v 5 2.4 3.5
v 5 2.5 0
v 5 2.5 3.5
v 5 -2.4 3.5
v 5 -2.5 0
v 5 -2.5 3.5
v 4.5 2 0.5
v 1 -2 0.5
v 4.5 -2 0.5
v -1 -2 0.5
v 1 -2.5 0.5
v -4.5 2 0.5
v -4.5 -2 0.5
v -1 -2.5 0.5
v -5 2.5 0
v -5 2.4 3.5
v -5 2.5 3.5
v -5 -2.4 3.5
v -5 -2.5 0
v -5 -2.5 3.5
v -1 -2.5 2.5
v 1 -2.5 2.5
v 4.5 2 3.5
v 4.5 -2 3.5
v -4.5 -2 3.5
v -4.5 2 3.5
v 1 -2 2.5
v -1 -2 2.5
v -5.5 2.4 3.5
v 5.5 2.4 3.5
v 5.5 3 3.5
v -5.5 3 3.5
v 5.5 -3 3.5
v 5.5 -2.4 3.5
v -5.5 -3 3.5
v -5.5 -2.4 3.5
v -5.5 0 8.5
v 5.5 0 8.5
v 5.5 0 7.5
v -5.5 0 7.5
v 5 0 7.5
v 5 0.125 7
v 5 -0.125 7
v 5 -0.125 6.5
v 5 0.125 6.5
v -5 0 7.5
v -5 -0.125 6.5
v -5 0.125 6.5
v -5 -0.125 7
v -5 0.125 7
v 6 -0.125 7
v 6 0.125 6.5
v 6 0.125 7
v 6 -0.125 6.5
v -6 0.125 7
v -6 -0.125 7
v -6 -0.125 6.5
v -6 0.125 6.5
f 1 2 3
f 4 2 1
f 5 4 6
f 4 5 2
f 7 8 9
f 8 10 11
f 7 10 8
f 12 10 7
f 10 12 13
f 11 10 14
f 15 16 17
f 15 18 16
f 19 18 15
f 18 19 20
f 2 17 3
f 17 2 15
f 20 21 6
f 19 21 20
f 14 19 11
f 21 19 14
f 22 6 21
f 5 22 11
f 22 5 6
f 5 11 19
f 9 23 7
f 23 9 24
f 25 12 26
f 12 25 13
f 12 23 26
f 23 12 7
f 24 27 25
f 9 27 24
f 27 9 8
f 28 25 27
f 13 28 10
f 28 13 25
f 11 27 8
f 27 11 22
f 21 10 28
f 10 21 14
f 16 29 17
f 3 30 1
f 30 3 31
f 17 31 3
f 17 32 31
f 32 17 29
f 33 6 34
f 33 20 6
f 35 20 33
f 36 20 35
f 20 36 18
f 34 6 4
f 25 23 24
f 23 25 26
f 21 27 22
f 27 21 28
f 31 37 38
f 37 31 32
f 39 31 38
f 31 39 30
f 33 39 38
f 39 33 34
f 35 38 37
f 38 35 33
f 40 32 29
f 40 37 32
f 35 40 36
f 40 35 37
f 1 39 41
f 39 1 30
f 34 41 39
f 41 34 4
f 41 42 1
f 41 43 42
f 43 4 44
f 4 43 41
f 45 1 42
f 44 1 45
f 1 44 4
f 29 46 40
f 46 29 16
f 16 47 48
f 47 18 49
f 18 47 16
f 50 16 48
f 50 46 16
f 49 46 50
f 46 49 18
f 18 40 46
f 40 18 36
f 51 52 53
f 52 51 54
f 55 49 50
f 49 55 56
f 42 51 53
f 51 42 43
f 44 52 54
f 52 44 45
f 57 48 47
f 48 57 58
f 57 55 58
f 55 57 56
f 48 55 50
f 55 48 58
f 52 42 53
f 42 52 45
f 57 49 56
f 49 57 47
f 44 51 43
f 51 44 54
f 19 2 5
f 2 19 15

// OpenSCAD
/*
    We divide the house into four components: the foundation, the lower walls,
    the upper walls, and the roof.
    
    The foundation is a flat layer that serves to define the building's
    footprint, and acts as a testament that the building once stood at all.
    
    The lower walls are the base for the upper walls, and are meant to be
    thicker and hardier. Stone to support the wood.

    The upper walls are moderately thinner than the lower walls, and are
    supposed to be stone, timber, or brick covered in plaster.
*/
/*
    To help keep things consistent, we'll define a set of constants and re-use
    them throughout.
    
    Here are some constants that AREN'T defined:
        - The "open" ends of the house's roof is always on the x-axis (so,
          looking up and down the y-axis, you see no gap)
        - The door is always centered on the X-axis, and sits ON the X-axis
          itself (the y-intercept, if you will)
*/
// What are the lengths of our foundation, per axis?
Y_FOUNDATION_LEN = 5;
X_FOUNDATION_LEN = 10;

// How tall is our foundation?
FOUNDATION_HEIGHT = .5;

// How thick are the lower walls?
LOWER_WALL_THICKNESS = .5;

// How tall are the lower walls? Keep in mind that this will be placed on TOP of
// the foundation
LOWER_WALL_HEIGHT = 1;

// How thick are the upper walls? This thickness will be centered around the
// lower walls, so that half of the thickness is on either half of the
// lower walls
UPPER_WALL_THICKNESS = .5;

// How tall are the upper walls? These walls will be placed on top of the lower
// walls; this height value is just the measure of the height of the components.
UPPER_WALL_HEIGHT = 2;

// The roof is distinctively peaked - what is the height of that peak? Keep in
// mind, this is just a measure of the roof component's height. This will be
// placed on top of the foundation and BOTH sets of walls!
ROOF_PEAK_HEIGHT = 5;

// The roof kinda peaks out on either side of the x and y axes. How far does it
// peak out from? The final roof will be the foundation size PLUS these values,
// where the overhang is doubled.
ROOF_X_OVERHANG = .5;
ROOF_Y_OVERHANG = .5;

// To create a "Divot" either side of the roof's x length, we create
// triangular prisms on either end and 'sink' them, cutting them out from the
// greater triangle. How much do we sink the divot? (move negative on Z)
ROOF_DIVOT_OFFSET = 1;

// To add an extra layer of medieval-authenticity, we'll put a crossbeam beneath
// the apex of the roof - how much do we sink the crossbeam downward?
ROOF_CROSSBEAM_OFFSET = 2.0;
// How deep is the crossbeam? (Length on Y Axis)
ROOF_CROSSBEAM_DEPTH = 0.25;
// How tall is the crossbeam? (Length on Z Axis)
ROOF_CROSSBEAM_HEIGHT = 0.5;
// Now, the crossbeam needs to peek out from underneath the roof's awning; this
// means the length (Length on X Axis) will AT LEAST be:
// (ROOF_X_OVERHANG * 2) + X_FOUNDATION_LEN
// This is the additional length ON TOP OF THAT length, so that the crossbeam
// hangs out at either end of the roof
ROOF_CROSSBEAM_OVERHANG = 0.5;

// How wide is the door?
DOOR_WIDTH = 2;

// How tall is the door? Remember, the door sits atop the foundation!
DOOR_HEIGHT = 2;

assert(UPPER_WALL_THICKNESS <= LOWER_WALL_THICKNESS, "Thickness of the upper walls must be less than or equal the thickness of the lower walls!");

module right_triangular_prism(x_len, y_len, h){
    polyhedron(
        points=[
            [0,0,0], 
            [x_len,0,0],
            [x_len,y_len,0],
            [0,y_len,0],
            [0,y_len,h],
            [x_len,y_len,h]
        ],
        faces=[
            [0,1,2,3],
            [5,4,3,2],
            [0,4,5,1],
            [0,3,4],
            [5,2,1]
        ]
    );
}
//

module isosceles_triangular_prism(x_len, y_len, height){
    polyhedron(
        points=[
            [    0,     0,      0], 
            [x_len,     0,      0],
            [x_len, y_len,      0],
            [    0, y_len,      0], 
            [    0, y_len / 2, height],
            [x_len, y_len / 2, height]
        ],
        faces=[
            [0,1,2,3],
            [5,4,3,2],
            [0,4,5,1],
            [0,3,4],
            [5,2,1]
        ]
    );
}
//

// Create the foundation, which is really just a blank square
module foundation(){
    cube( [X_FOUNDATION_LEN, Y_FOUNDATION_LEN, FOUNDATION_HEIGHT] );
}
//

// The door isn't a door so much as an empty space carved into the walls. To
// carve out the door, we need a block to carve with - this is that block.
module door_spacing_block(){
    centering_translation = [
        (X_FOUNDATION_LEN / 2) - (DOOR_WIDTH / 2), 
        -LOWER_WALL_THICKNESS / 2,
        FOUNDATION_HEIGHT
    ]; 
    
    translate(centering_translation)
    cube( [DOOR_WIDTH, LOWER_WALL_THICKNESS * 2, DOOR_HEIGHT] );
}
//

// Makes the lower walls, without a door. This is important, since we have to
// carve the space for the door out of something
module lower_walls_doorless(){
    /*
        Consider a rectangle, A, that contains a rectangle, B, such that the
        edges of B are at a constant distance from each other (this might break
        down around the edges, because diagonals, but whatever). We'll call this
        constant distance C. We know that the length of A minus the 
        length of B equals 2 * C (since there's a C of difference on either
        side). This allows us to calculate:
    
        A = 2C + B
        B = A - 2C
        C = (A - B) / 2
    
        In this case, A is our foundation length, and C is the lower wall's
        thickness. The size of the room to carve, then, is B!
    */
    // For our initial carve, A is the Foundation length, and B is the Lower
    // Wall thickness.
    carve_factor_x = X_FOUNDATION_LEN - ( 2 * LOWER_WALL_THICKNESS);
    carve_factor_y = Y_FOUNDATION_LEN - ( 2 * LOWER_WALL_THICKNESS);

    // The walls are made by carving out a block from the center of a larger
    // block - how do we move that smaller block?
    carver_translation = [
        LOWER_WALL_THICKNESS, // Move by C
        LOWER_WALL_THICKNESS, // Move by C
        -LOWER_WALL_HEIGHT / 2
    ]; 
    
    translate([0, 0, FOUNDATION_HEIGHT])
    difference(){
        cube( [X_FOUNDATION_LEN, Y_FOUNDATION_LEN, LOWER_WALL_HEIGHT] );
        
        translate(carver_translation)
        cube( [carve_factor_x, carve_factor_y, LOWER_WALL_HEIGHT * 2 ]);
    }
}
//

// Makes the lower walls, without a door. This is important, since we have to
// carve the space for the door out of something
module upper_walls_doorless(){
    
    /*cube( [carve_size_x, carve_size_y, UPPER_WALL_HEIGHT + .2 ])
        Now, with the Upper Wall, things get tricky. The wall must be centered
        on the lower wall. So, we have basically FOUR rectangles now instead of
        just two. We have the two rectangles we had for the lower walls, A and
        B, which are separated by a consistent distance, C. However, there are
        now two rectangles between them, that we'll call Q and R. Q and R are
        a new constant distance apart, D. Q is a consistent Distance from A,   
        which we'll call E, and R is the same with B; this shall the same value
        as E.
        
        In this case, our values are:
        A = FOUNDATION_LEN
        B = ???
        C = LOWER_WALL_THICKNESS
        D = UPPER_WALL_THICKNESS
        E = ???
        
        We know how to calculate C, but how about E? Well, we know that D is 
        centered ON C, and E is the leftover distance on either side - ergo,
        there'll be two of them. So, we know that C is:
        
        C = D + E2
        
        Solving for E, this becomes:
        
        E = (C - D) / 2
        
        Of course, we can't forget that E exists on both sides of EACH TRIANGLE!
        So the size of our first rectangle is (A - 2E). The carving rectangle
        will then be (A - 2(E + D)). To carve out the rectangle considering a
        start at origin, we need to shift the carving rectangle by the width of
        D
    */
    // What's the size of E from that giant stupid explanation we just did
    e_factor = (LOWER_WALL_THICKNESS - UPPER_WALL_THICKNESS) / 2;
    
    // A - 2 * E
    base_size_x = X_FOUNDATION_LEN - (2 * e_factor);
    base_size_y = Y_FOUNDATION_LEN - (2 * e_factor);
    
    // A - 2 * (E + D)
    carve_size_x = X_FOUNDATION_LEN - 2 * (e_factor + UPPER_WALL_THICKNESS);
    carve_size_y = Y_FOUNDATION_LEN - 2 * (e_factor + UPPER_WALL_THICKNESS);
    
    carve_shift= [
        UPPER_WALL_THICKNESS, // D
        UPPER_WALL_THICKNESS, // D
        -.1
    ];
    
    translate([e_factor, e_factor, FOUNDATION_HEIGHT + LOWER_WALL_HEIGHT])
    difference(){
        cube( [base_size_x, base_size_y, UPPER_WALL_HEIGHT] );
        
        translate(carve_shift)
        cube( [carve_size_x, carve_size_y, UPPER_WALL_HEIGHT + .2 ]);
    }
}
//

module lower_walls(){   
    difference(){
        lower_walls_doorless();
        door_spacing_block();
    }
}
//

module upper_walls(){   
    difference(){
        upper_walls_doorless();
        door_spacing_block();
    }
}
//

module roof(){
    
    ROOF_BASE_HEIGHT = UPPER_WALL_HEIGHT + LOWER_WALL_HEIGHT + FOUNDATION_HEIGHT;
    
    X_ROOF_LEN = X_FOUNDATION_LEN + (ROOF_X_OVERHANG * 2);
    Y_ROOF_LEN = Y_FOUNDATION_LEN + (ROOF_Y_OVERHANG * 2);
    
    difference(){
        difference() {
            translate([
                -ROOF_X_OVERHANG, 
                -ROOF_Y_OVERHANG, 
                ROOF_BASE_HEIGHT
            ])
            isosceles_triangular_prism(
                X_ROOF_LEN, 
                Y_ROOF_LEN, 
                ROOF_PEAK_HEIGHT
            );
            
            translate([
                X_FOUNDATION_LEN,
                -ROOF_Y_OVERHANG,
                ROOF_BASE_HEIGHT - ROOF_DIVOT_OFFSET
            ])
            isosceles_triangular_prism(
                ROOF_X_OVERHANG, 
                Y_ROOF_LEN, 
                ROOF_PEAK_HEIGHT
            );
        };
        translate([
            -ROOF_X_OVERHANG,
            -ROOF_Y_OVERHANG,
            ROOF_BASE_HEIGHT - ROOF_DIVOT_OFFSET
        ])
        isosceles_triangular_prism(
            ROOF_X_OVERHANG, 
            Y_ROOF_LEN, 
            ROOF_PEAK_HEIGHT
        );
    };
    //
    
    xroof = X_FOUNDATION_LEN + (2 * ROOF_X_OVERHANG);
    cb_x_len = xroof + (2 * ROOF_CROSSBEAM_OVERHANG);
    cb_z_len = ROOF_BASE_HEIGHT + ROOF_PEAK_HEIGHT;
    translate([
        -(ROOF_X_OVERHANG + ROOF_CROSSBEAM_OVERHANG),
        (Y_FOUNDATION_LEN / 2) - (ROOF_CROSSBEAM_DEPTH / 2),
        cb_z_len - ROOF_CROSSBEAM_OFFSET
    ])
    cube( [cb_x_len, ROOF_CROSSBEAM_DEPTH, ROOF_CROSSBEAM_HEIGHT]);
}
//

// Upper walls, style01: No windows
module upper_walls(){   
    difference(){
        upper_walls_doorless();
        door_spacing_block();
    }
}
//

// Stairs
//

translate([-X_FOUNDATION_LEN / 2, -Y_FOUNDATION_LEN / 2, 0]){
    color("#0B2545")
    lower_walls();
    color("#134074")
    upper_walls();
    color("#EEF4ED")
    foundation();
    color("#13315C")
    roof();
}
//
